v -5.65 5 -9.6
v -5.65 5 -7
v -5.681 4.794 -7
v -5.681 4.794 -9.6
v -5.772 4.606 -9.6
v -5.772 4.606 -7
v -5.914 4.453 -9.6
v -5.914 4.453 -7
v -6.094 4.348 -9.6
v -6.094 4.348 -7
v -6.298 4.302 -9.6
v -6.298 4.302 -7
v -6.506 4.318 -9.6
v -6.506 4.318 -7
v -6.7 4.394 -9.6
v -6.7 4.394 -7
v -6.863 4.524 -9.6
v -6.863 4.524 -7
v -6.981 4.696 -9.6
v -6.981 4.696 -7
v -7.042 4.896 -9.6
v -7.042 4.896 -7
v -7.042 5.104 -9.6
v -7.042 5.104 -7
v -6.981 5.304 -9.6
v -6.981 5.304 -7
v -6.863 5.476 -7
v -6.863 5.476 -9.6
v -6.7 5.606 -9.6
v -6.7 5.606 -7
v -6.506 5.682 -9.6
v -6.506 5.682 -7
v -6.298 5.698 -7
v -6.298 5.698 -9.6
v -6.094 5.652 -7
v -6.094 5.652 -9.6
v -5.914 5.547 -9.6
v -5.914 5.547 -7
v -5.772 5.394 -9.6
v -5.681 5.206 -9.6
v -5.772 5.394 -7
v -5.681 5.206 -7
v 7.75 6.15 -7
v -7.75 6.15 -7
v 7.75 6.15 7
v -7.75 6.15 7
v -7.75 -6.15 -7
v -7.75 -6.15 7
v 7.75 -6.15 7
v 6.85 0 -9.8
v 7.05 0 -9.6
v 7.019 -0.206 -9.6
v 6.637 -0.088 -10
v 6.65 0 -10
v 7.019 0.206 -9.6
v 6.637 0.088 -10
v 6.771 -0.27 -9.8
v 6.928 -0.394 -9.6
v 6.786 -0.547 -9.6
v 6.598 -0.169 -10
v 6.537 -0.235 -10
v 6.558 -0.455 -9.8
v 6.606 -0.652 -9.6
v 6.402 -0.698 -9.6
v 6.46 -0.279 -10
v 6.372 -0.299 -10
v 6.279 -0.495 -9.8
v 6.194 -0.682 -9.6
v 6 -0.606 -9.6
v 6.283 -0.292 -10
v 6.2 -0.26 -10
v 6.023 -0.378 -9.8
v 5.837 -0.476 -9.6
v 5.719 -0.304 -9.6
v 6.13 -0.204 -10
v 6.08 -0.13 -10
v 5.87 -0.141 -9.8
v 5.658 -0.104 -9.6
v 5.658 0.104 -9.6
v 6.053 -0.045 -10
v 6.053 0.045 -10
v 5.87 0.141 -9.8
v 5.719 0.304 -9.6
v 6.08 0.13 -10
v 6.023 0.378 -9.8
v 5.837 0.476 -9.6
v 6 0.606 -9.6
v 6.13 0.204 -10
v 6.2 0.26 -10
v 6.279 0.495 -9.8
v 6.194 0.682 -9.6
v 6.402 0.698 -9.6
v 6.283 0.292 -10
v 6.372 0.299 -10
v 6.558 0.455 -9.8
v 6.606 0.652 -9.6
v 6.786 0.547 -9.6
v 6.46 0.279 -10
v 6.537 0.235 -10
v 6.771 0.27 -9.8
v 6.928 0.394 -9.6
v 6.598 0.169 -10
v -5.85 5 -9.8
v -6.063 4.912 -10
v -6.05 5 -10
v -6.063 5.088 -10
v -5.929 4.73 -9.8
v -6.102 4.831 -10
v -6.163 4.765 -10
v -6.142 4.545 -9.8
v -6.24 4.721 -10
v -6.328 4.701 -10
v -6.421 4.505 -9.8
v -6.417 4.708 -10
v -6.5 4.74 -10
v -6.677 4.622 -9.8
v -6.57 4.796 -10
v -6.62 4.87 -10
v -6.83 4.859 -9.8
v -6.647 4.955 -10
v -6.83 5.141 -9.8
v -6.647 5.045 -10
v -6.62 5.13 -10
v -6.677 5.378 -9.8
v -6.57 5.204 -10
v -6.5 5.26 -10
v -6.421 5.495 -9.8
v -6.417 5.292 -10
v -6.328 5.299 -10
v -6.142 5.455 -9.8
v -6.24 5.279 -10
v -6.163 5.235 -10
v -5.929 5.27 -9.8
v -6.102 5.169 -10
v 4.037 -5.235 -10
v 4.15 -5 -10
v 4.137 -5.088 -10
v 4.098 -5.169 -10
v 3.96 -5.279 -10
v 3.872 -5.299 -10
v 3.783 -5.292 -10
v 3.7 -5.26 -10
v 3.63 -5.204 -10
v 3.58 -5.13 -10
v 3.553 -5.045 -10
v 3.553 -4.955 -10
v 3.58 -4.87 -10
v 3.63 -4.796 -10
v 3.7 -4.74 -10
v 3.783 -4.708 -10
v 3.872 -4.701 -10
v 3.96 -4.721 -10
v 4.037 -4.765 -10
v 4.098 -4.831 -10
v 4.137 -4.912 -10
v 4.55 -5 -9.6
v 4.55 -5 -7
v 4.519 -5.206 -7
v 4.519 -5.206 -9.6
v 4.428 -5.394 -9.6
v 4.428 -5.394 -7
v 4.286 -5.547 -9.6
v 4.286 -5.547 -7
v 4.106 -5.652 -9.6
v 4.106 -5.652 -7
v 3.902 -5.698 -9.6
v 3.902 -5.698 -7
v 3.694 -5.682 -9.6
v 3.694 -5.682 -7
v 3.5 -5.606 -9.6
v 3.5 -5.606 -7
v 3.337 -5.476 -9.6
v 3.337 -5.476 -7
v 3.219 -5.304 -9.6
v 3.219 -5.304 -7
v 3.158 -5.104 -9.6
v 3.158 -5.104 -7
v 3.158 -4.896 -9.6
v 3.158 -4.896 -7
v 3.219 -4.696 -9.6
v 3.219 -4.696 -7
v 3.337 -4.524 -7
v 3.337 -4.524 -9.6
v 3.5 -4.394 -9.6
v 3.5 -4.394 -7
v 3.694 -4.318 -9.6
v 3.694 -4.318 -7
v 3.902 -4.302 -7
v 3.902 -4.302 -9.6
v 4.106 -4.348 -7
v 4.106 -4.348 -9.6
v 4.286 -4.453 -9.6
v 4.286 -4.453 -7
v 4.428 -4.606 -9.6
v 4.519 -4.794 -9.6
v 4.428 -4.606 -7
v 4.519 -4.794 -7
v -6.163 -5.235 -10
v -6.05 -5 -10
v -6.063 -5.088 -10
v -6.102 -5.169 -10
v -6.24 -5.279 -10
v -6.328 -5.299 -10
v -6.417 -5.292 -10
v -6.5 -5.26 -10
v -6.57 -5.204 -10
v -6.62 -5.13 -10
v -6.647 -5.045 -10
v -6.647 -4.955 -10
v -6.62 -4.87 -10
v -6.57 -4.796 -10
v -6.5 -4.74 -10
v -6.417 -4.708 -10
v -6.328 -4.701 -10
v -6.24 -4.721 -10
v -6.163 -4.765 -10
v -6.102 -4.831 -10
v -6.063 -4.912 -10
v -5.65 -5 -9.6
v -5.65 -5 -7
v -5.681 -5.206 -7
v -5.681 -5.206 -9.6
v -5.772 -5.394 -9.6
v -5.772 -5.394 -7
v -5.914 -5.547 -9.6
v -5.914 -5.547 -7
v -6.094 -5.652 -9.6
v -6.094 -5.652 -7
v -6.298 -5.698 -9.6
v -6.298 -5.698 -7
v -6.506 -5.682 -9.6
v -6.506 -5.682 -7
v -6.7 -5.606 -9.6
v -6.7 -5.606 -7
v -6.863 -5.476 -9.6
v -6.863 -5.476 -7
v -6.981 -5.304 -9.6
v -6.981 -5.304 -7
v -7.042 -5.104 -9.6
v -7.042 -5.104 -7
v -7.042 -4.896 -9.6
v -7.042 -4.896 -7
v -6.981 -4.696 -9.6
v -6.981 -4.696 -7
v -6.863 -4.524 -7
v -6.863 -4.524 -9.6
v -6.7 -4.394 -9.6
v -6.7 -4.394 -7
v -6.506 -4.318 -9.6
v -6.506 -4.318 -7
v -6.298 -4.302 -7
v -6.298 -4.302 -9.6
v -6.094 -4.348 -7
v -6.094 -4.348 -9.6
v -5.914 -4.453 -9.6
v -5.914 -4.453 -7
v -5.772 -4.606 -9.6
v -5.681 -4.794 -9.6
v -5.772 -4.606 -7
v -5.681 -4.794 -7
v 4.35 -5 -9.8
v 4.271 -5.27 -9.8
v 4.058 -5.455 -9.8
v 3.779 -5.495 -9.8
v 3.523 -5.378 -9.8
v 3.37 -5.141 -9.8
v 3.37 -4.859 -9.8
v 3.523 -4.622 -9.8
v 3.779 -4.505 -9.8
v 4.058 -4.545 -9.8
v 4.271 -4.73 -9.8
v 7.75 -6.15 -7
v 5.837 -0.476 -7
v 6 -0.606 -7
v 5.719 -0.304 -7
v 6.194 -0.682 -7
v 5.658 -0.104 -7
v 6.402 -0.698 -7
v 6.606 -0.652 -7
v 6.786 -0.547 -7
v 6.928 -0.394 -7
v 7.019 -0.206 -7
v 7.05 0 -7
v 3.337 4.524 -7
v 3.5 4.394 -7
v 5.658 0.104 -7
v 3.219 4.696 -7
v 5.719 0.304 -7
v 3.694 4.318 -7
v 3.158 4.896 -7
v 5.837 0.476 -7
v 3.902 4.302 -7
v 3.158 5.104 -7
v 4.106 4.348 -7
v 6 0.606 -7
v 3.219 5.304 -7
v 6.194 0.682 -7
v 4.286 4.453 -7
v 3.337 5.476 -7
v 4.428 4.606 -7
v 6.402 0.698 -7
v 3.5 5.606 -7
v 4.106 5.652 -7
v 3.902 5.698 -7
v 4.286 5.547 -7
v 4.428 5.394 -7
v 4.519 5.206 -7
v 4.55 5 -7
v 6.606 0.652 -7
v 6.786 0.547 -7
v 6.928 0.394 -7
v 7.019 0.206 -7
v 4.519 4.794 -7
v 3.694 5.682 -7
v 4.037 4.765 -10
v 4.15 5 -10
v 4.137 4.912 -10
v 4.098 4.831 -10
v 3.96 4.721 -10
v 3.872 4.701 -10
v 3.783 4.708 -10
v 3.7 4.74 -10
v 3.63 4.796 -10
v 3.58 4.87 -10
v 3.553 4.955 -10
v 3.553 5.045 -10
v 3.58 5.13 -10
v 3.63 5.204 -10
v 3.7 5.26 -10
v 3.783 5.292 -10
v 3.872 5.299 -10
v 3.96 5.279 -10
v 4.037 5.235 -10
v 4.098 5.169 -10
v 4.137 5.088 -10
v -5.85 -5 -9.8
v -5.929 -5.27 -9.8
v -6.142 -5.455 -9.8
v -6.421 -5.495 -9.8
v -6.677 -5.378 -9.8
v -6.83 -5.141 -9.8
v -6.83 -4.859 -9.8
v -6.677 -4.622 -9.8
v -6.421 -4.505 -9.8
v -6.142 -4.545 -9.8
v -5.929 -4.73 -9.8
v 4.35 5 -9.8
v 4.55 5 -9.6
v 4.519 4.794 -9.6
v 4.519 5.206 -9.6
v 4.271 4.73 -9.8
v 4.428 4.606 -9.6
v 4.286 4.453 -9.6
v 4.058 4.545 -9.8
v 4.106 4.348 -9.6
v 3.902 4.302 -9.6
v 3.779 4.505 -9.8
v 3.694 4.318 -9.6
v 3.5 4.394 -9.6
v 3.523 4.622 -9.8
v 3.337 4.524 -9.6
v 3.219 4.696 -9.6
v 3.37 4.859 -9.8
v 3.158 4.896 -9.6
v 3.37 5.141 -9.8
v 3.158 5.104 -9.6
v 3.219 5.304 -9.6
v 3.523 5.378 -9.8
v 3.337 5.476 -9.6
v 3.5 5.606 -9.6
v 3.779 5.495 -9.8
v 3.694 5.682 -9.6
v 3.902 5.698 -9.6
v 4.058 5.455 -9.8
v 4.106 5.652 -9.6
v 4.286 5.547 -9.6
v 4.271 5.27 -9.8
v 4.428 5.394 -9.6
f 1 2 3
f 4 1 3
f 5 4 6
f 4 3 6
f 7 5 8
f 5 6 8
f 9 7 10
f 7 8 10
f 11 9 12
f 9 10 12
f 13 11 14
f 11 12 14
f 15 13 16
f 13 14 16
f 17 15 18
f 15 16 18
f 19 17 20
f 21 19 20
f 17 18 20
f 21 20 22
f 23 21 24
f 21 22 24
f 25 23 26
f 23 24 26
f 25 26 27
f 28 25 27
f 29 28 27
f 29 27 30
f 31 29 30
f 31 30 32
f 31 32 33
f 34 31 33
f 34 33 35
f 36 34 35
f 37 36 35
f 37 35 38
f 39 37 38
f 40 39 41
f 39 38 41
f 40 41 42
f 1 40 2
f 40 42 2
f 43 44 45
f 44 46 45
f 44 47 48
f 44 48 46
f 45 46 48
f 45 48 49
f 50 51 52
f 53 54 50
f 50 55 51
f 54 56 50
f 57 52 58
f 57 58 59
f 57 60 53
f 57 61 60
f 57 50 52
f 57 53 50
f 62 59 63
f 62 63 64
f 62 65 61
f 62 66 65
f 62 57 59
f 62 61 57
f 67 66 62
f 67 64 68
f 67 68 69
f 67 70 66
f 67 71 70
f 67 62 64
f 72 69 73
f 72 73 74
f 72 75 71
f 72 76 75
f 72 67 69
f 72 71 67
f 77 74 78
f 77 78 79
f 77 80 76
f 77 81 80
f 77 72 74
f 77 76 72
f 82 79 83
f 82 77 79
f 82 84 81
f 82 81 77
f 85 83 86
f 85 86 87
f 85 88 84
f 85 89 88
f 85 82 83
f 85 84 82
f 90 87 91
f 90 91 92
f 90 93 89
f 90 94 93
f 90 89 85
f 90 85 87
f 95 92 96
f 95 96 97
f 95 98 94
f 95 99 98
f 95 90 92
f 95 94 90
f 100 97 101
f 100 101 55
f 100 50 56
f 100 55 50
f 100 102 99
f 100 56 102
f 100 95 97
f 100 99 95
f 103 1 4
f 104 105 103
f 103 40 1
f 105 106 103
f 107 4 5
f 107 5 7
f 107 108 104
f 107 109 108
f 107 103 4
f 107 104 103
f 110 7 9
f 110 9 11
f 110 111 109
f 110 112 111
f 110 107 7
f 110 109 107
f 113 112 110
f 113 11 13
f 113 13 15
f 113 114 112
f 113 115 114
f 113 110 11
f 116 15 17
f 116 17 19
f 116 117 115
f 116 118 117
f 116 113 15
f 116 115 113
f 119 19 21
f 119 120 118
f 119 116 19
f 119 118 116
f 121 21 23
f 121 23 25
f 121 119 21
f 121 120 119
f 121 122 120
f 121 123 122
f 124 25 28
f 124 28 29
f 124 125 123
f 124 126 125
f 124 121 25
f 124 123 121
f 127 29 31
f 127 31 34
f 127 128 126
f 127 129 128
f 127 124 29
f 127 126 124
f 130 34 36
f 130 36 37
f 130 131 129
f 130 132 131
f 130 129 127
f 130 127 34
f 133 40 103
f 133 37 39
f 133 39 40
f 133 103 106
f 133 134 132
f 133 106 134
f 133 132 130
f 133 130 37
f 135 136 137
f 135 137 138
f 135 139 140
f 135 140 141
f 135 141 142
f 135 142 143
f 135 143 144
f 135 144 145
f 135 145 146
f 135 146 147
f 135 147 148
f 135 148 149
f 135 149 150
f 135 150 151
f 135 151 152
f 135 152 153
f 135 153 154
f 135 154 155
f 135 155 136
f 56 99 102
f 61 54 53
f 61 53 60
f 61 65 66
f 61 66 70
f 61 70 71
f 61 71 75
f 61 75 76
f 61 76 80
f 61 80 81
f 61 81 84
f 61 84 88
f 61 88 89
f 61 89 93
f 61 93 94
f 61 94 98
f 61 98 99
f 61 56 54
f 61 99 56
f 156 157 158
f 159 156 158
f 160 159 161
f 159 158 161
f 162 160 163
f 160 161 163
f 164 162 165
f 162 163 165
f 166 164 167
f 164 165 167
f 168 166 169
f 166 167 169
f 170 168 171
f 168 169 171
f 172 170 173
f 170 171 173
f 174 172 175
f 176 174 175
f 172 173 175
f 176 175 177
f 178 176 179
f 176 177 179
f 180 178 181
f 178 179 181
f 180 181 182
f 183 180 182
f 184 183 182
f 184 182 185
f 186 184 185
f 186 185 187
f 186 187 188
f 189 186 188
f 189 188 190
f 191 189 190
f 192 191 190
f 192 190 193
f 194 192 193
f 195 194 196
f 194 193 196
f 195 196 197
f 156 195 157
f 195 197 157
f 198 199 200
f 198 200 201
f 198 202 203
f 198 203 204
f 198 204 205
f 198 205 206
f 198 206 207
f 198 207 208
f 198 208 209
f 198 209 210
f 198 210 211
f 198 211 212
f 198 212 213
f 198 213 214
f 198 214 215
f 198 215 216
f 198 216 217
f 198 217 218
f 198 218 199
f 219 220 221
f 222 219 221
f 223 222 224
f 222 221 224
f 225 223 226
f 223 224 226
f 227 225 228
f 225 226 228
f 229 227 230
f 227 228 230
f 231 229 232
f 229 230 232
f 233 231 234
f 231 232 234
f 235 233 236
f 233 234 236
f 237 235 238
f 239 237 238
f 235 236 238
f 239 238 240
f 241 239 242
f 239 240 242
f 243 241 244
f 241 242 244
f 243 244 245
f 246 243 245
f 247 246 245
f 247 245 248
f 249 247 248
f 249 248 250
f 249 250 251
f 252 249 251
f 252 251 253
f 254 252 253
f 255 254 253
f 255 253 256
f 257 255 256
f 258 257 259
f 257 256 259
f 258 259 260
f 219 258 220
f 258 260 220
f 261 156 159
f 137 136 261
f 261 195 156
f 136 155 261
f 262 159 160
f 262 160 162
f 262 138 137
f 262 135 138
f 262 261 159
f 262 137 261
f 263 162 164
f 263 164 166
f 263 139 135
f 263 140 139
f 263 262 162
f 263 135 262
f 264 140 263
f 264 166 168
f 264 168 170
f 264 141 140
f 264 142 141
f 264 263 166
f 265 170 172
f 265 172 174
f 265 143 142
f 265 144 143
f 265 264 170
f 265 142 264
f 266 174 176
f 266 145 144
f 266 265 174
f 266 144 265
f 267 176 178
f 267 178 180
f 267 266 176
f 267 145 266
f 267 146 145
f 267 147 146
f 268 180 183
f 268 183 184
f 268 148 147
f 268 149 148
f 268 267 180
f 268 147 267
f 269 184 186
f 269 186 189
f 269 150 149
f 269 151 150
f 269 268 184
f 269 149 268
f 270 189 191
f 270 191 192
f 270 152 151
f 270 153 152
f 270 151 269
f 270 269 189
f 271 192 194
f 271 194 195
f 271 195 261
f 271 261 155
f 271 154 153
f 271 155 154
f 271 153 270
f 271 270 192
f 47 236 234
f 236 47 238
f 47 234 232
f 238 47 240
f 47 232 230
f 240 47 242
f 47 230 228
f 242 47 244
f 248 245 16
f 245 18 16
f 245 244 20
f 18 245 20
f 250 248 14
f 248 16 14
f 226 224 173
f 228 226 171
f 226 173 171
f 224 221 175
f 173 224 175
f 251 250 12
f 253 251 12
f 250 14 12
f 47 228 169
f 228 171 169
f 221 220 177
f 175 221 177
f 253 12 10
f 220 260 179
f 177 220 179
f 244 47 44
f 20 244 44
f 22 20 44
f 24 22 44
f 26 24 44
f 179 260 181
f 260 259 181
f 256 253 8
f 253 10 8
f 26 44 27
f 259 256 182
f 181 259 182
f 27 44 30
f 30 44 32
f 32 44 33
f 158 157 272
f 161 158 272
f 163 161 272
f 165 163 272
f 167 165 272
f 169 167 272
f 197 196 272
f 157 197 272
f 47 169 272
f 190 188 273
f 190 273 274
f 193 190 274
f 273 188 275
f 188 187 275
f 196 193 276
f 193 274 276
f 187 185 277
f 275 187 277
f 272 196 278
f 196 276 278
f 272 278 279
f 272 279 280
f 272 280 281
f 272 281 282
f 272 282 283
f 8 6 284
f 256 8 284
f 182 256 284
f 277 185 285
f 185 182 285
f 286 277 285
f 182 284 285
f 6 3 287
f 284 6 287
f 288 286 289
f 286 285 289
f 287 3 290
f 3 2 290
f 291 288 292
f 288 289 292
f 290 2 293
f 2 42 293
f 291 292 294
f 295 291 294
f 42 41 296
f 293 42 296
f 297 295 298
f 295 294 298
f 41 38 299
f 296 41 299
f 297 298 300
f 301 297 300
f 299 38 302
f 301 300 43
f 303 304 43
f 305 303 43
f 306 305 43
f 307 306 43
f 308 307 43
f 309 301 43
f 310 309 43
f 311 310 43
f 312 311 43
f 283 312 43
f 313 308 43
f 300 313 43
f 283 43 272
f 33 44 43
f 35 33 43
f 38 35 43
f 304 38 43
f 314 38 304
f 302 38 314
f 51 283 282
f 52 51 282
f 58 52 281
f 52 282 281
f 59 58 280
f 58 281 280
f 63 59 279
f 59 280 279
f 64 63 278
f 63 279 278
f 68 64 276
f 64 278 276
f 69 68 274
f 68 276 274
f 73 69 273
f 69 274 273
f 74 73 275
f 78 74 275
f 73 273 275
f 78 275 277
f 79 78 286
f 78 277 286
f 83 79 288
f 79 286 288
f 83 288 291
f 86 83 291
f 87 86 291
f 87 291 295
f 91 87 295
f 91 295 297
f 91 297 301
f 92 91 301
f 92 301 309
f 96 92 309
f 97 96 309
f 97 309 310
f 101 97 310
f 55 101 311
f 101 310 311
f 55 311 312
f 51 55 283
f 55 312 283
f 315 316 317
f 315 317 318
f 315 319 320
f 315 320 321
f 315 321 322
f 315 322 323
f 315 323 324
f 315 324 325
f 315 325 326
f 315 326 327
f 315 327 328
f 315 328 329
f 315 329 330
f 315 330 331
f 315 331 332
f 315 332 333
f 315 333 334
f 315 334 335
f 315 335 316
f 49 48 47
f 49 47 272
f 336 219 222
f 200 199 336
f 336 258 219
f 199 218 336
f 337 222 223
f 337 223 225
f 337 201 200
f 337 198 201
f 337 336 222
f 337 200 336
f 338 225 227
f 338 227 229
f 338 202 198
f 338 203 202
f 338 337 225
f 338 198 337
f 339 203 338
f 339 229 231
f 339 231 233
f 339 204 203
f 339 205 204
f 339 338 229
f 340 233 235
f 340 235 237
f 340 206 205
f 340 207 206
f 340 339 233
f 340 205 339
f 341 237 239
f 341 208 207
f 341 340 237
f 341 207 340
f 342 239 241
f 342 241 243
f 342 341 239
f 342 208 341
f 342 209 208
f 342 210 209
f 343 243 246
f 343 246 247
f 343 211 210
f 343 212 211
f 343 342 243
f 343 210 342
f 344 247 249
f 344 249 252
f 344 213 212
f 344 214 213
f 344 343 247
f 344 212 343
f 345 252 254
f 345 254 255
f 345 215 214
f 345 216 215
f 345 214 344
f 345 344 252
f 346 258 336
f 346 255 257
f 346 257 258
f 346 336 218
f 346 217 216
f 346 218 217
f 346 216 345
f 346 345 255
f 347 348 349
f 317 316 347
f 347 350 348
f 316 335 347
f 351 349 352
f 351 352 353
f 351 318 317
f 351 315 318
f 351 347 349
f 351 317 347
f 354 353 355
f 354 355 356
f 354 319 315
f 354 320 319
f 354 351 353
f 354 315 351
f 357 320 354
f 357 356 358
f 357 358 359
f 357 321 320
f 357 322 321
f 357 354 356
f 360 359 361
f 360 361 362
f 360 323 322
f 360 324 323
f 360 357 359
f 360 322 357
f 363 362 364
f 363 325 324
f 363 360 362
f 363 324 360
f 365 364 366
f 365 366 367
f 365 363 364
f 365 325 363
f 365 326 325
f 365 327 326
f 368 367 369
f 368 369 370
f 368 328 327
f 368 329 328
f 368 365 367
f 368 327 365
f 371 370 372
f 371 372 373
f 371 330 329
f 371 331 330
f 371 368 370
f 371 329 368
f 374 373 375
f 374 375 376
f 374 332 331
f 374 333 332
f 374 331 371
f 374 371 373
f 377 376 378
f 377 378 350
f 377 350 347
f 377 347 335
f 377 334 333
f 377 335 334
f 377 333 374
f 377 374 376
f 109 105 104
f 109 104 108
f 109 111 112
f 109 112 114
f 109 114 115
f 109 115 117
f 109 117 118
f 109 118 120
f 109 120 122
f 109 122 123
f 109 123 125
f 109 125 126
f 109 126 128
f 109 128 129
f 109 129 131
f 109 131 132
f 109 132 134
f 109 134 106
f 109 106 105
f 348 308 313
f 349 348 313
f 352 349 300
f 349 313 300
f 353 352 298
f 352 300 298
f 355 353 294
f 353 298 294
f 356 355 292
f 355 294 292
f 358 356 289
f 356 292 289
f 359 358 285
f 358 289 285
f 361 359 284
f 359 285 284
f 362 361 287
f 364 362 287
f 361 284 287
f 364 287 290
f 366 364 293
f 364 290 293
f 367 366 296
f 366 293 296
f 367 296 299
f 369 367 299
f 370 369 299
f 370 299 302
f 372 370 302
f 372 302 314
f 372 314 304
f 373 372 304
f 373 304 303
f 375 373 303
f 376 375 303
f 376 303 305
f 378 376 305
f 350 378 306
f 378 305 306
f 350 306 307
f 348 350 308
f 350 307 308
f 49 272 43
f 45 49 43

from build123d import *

# Parameters (mm, degrees)
SKETCH1_W           = 15.5
SKETCH1_H           = 12.3
BOSS_EXTRUDE1_DEPTH = 7
SKETCH2_R           = 0.7
BOSS_EXTRUDE2_DEPTH = 3
CHAMFER1_SIZE       = 0.4


with BuildPart() as part:
    # Sketch1 → Boss-Extrude1 (new, symmetric)
    with BuildSketch(Plane.XY):
        Rectangle(SKETCH1_W, SKETCH1_H)
    extrude(amount=BOSS_EXTRUDE1_DEPTH, both=True)

    # Sketch2 → Boss-Extrude2 (add)
    with BuildSketch(Plane(origin=(0, 0, -7), x_dir=(-1, 0, 0), z_dir=(0, 0, -1))):
        with Locations(Location((-3.85, 5, 0), (0, 0, 180))):
            Circle(SKETCH2_R)
        with Locations(Location((6.35, 5, 0), (0, 0, 180))):
            Circle(SKETCH2_R)
        with Locations(Location((6.35, -5, 0), (0, 0, 180))):
            Circle(SKETCH2_R)
        with Locations(Location((-3.85, -5, 0), (0, 0, 180))):
            Circle(SKETCH2_R)
        with Locations(Location((-6.35, 0, 0), (0, 0, 180))):
            Circle(SKETCH2_R)
    extrude(amount=BOSS_EXTRUDE2_DEPTH)

    # Chamfer1
    chamfer1_edges = [part.edges().sort_by_distance(p)[0] for p in [
        (3.15, 5, -10),
        (-7.05, 5, -10),
        (-7.05, -5, -10),
        (3.15, -5, -10),
        (5.65, 0, -10),
    ]]
    chamfer(chamfer1_edges, length=CHAMFER1_SIZE)


solid = part.part
